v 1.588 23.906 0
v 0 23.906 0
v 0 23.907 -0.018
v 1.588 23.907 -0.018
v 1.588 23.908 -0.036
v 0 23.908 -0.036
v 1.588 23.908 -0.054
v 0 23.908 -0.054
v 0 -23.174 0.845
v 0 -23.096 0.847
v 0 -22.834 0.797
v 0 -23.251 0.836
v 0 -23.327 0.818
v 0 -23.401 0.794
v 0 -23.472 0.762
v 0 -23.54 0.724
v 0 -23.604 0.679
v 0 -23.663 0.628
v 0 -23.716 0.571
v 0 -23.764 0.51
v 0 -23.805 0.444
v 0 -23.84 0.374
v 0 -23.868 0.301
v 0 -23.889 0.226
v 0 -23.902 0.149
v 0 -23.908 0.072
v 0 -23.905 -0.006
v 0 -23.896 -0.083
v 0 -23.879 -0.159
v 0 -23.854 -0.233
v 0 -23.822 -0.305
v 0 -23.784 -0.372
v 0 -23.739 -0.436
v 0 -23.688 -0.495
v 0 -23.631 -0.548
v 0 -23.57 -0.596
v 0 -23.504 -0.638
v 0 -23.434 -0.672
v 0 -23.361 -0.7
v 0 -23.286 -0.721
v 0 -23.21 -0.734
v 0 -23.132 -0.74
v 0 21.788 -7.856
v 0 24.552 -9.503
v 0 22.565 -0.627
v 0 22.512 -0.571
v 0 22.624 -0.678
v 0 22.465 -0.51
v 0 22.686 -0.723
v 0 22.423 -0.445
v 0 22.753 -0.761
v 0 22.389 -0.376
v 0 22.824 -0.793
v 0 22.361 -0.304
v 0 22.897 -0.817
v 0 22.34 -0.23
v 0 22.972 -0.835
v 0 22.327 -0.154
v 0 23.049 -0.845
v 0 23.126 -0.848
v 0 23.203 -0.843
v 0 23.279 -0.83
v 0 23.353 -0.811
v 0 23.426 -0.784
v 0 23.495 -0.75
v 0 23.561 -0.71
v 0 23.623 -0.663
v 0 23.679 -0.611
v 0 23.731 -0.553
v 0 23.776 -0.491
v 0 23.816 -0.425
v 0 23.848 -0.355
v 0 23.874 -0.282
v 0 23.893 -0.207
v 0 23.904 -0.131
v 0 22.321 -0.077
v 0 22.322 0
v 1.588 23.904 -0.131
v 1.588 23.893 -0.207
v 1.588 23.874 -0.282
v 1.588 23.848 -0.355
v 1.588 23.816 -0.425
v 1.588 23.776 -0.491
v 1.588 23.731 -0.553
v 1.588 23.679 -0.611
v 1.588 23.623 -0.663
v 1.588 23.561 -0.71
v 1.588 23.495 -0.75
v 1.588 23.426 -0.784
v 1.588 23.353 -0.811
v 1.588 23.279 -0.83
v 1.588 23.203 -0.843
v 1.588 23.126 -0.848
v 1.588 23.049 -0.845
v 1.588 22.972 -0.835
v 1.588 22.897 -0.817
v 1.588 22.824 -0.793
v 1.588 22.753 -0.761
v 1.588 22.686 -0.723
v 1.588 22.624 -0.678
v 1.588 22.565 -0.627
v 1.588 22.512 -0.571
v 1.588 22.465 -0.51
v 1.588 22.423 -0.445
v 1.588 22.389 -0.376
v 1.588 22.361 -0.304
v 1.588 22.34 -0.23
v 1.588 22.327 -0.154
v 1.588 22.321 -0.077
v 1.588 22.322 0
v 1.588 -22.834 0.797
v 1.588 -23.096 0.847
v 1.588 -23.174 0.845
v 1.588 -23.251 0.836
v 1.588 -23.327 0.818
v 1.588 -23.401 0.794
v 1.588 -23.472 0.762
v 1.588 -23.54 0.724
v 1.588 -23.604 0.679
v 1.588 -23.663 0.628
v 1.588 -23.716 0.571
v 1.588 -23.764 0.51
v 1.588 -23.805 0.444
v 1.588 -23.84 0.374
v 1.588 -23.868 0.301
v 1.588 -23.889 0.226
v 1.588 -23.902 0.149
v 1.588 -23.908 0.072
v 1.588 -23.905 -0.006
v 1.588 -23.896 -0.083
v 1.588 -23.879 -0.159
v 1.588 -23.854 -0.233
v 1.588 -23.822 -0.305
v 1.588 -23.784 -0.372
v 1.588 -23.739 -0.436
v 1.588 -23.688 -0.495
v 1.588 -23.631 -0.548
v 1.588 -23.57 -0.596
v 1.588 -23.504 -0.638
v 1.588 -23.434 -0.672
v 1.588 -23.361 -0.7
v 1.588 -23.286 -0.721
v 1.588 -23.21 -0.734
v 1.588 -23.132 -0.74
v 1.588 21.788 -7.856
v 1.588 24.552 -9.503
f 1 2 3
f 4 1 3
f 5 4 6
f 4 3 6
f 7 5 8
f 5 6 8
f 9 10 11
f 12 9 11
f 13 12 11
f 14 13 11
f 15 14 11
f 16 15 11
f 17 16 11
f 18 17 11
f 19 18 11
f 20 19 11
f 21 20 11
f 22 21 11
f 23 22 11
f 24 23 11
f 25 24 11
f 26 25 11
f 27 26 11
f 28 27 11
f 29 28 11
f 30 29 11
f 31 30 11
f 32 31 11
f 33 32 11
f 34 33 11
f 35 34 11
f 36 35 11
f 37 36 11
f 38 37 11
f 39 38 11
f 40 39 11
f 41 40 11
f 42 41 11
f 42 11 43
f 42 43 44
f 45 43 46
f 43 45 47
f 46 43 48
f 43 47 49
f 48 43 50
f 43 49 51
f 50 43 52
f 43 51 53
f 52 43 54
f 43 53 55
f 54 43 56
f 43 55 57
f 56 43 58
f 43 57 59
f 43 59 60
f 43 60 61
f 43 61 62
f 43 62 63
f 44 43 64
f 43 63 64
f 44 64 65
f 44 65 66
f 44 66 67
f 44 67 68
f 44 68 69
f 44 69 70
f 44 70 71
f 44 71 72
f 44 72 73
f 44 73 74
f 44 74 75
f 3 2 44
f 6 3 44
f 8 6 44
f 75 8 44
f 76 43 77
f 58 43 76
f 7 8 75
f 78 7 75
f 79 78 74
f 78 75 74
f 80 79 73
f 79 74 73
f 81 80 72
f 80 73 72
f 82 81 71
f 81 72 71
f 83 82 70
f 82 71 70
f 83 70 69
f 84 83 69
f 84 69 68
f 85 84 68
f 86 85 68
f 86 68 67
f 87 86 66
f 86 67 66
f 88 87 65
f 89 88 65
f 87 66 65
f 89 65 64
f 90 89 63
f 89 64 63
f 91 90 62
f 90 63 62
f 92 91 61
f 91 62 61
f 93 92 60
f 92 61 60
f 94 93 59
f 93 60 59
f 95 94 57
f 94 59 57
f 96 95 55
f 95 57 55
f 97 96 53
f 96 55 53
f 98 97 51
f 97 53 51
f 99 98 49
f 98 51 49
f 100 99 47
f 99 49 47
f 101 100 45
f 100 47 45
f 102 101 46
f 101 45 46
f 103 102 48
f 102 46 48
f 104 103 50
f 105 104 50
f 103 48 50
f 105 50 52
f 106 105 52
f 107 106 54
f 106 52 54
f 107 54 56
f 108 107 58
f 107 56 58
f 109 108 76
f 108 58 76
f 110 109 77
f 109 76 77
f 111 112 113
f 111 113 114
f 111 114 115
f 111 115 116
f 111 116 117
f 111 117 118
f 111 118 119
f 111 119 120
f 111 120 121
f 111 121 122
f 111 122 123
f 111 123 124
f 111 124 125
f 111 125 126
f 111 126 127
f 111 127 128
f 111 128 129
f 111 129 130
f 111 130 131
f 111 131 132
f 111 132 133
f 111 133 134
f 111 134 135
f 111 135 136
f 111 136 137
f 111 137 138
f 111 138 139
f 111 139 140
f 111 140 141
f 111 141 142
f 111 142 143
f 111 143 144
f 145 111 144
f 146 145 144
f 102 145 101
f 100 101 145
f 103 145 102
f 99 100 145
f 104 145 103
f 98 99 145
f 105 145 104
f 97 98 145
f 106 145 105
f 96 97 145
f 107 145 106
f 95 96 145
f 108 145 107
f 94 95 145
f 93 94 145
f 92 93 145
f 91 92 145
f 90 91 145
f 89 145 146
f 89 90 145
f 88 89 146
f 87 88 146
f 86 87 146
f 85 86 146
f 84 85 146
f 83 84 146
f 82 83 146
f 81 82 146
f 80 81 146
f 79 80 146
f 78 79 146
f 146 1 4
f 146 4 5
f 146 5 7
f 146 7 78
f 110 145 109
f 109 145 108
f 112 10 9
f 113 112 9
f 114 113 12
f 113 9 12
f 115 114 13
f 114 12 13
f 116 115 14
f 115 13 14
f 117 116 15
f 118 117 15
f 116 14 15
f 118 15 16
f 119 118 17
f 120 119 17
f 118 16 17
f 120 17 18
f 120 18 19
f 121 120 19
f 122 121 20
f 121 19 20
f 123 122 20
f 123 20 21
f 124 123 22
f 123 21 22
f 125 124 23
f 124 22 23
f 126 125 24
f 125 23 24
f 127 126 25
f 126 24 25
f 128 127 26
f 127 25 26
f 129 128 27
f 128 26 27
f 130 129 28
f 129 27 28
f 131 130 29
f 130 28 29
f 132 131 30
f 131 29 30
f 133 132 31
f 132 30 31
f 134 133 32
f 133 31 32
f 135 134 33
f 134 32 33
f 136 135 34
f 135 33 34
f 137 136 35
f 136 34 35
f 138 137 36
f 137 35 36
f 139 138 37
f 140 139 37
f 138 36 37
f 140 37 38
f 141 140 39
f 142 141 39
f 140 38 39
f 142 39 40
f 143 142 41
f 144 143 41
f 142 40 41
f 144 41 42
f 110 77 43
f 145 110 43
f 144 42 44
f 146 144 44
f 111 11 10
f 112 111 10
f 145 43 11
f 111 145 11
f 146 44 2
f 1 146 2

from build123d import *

# Parameters (mm, degrees)
F1_DEPTH = 1.5875


# Not quite as in the source:
# - a feature names something its author has since deleted; it is built from what else it names


with BuildPart() as f1:
    # F0 (on Right) → F1 (new body)
    with BuildSketch(Plane.YZ):
        with BuildLine():
            ThreePointArc((-22.32025, 0.0538603849), (-22.5590646592, -0.5136656763), (-23.1318048474, -0.739689897))
            Line((-23.1318048474, -0.739689897), (24.5522451458, -9.5030463267))
            Line((24.5522451458, -9.5030463267), (23.9059205272, 0))
            ThreePointArc((23.9059205272, 0), (23.9072925, -0.0269146615), (23.90775, -0.0538603849))
            ThreePointArc((23.90775, -0.0538603849), (23.0870542766, -0.8471528848), (22.3220794728, 0))
            Line((22.3220794728, 0), (21.7877844548, -7.8558516301))
            Line((21.7877844548, -7.8558516301), (-22.8339183638, 0.796553686))
            ThreePointArc((-22.8339183638, 0.796553686), (-22.461177719, 0.5053713282), (-22.32025, 0.0538603849))
        make_face()
        with BuildLine():
            Line((-23.0961951526, 0.8474106668), (-23.1318048474, -0.739689897))
            ThreePointArc((-23.1318048474, -0.739689897), (-22.5590646592, -0.5136656763), (-22.32025, 0.0538603849))
            ThreePointArc((-22.32025, 0.0538603849), (-22.461177719, 0.5053713282), (-22.8339183638, 0.796553686))
            Line((-22.8339183638, 0.796553686), (-23.0961951526, 0.8474106668))
        make_face()
        with BuildLine():
            ThreePointArc((-23.0961951526, 0.8474106668), (-23.9075502819, 0.0716652323), (-23.1318048474, -0.739689897))
            Line((-23.1318048474, -0.739689897), (-23.0961951526, 0.8474106668))
        make_face()
    extrude(amount=F1_DEPTH)


solid = f1.part
